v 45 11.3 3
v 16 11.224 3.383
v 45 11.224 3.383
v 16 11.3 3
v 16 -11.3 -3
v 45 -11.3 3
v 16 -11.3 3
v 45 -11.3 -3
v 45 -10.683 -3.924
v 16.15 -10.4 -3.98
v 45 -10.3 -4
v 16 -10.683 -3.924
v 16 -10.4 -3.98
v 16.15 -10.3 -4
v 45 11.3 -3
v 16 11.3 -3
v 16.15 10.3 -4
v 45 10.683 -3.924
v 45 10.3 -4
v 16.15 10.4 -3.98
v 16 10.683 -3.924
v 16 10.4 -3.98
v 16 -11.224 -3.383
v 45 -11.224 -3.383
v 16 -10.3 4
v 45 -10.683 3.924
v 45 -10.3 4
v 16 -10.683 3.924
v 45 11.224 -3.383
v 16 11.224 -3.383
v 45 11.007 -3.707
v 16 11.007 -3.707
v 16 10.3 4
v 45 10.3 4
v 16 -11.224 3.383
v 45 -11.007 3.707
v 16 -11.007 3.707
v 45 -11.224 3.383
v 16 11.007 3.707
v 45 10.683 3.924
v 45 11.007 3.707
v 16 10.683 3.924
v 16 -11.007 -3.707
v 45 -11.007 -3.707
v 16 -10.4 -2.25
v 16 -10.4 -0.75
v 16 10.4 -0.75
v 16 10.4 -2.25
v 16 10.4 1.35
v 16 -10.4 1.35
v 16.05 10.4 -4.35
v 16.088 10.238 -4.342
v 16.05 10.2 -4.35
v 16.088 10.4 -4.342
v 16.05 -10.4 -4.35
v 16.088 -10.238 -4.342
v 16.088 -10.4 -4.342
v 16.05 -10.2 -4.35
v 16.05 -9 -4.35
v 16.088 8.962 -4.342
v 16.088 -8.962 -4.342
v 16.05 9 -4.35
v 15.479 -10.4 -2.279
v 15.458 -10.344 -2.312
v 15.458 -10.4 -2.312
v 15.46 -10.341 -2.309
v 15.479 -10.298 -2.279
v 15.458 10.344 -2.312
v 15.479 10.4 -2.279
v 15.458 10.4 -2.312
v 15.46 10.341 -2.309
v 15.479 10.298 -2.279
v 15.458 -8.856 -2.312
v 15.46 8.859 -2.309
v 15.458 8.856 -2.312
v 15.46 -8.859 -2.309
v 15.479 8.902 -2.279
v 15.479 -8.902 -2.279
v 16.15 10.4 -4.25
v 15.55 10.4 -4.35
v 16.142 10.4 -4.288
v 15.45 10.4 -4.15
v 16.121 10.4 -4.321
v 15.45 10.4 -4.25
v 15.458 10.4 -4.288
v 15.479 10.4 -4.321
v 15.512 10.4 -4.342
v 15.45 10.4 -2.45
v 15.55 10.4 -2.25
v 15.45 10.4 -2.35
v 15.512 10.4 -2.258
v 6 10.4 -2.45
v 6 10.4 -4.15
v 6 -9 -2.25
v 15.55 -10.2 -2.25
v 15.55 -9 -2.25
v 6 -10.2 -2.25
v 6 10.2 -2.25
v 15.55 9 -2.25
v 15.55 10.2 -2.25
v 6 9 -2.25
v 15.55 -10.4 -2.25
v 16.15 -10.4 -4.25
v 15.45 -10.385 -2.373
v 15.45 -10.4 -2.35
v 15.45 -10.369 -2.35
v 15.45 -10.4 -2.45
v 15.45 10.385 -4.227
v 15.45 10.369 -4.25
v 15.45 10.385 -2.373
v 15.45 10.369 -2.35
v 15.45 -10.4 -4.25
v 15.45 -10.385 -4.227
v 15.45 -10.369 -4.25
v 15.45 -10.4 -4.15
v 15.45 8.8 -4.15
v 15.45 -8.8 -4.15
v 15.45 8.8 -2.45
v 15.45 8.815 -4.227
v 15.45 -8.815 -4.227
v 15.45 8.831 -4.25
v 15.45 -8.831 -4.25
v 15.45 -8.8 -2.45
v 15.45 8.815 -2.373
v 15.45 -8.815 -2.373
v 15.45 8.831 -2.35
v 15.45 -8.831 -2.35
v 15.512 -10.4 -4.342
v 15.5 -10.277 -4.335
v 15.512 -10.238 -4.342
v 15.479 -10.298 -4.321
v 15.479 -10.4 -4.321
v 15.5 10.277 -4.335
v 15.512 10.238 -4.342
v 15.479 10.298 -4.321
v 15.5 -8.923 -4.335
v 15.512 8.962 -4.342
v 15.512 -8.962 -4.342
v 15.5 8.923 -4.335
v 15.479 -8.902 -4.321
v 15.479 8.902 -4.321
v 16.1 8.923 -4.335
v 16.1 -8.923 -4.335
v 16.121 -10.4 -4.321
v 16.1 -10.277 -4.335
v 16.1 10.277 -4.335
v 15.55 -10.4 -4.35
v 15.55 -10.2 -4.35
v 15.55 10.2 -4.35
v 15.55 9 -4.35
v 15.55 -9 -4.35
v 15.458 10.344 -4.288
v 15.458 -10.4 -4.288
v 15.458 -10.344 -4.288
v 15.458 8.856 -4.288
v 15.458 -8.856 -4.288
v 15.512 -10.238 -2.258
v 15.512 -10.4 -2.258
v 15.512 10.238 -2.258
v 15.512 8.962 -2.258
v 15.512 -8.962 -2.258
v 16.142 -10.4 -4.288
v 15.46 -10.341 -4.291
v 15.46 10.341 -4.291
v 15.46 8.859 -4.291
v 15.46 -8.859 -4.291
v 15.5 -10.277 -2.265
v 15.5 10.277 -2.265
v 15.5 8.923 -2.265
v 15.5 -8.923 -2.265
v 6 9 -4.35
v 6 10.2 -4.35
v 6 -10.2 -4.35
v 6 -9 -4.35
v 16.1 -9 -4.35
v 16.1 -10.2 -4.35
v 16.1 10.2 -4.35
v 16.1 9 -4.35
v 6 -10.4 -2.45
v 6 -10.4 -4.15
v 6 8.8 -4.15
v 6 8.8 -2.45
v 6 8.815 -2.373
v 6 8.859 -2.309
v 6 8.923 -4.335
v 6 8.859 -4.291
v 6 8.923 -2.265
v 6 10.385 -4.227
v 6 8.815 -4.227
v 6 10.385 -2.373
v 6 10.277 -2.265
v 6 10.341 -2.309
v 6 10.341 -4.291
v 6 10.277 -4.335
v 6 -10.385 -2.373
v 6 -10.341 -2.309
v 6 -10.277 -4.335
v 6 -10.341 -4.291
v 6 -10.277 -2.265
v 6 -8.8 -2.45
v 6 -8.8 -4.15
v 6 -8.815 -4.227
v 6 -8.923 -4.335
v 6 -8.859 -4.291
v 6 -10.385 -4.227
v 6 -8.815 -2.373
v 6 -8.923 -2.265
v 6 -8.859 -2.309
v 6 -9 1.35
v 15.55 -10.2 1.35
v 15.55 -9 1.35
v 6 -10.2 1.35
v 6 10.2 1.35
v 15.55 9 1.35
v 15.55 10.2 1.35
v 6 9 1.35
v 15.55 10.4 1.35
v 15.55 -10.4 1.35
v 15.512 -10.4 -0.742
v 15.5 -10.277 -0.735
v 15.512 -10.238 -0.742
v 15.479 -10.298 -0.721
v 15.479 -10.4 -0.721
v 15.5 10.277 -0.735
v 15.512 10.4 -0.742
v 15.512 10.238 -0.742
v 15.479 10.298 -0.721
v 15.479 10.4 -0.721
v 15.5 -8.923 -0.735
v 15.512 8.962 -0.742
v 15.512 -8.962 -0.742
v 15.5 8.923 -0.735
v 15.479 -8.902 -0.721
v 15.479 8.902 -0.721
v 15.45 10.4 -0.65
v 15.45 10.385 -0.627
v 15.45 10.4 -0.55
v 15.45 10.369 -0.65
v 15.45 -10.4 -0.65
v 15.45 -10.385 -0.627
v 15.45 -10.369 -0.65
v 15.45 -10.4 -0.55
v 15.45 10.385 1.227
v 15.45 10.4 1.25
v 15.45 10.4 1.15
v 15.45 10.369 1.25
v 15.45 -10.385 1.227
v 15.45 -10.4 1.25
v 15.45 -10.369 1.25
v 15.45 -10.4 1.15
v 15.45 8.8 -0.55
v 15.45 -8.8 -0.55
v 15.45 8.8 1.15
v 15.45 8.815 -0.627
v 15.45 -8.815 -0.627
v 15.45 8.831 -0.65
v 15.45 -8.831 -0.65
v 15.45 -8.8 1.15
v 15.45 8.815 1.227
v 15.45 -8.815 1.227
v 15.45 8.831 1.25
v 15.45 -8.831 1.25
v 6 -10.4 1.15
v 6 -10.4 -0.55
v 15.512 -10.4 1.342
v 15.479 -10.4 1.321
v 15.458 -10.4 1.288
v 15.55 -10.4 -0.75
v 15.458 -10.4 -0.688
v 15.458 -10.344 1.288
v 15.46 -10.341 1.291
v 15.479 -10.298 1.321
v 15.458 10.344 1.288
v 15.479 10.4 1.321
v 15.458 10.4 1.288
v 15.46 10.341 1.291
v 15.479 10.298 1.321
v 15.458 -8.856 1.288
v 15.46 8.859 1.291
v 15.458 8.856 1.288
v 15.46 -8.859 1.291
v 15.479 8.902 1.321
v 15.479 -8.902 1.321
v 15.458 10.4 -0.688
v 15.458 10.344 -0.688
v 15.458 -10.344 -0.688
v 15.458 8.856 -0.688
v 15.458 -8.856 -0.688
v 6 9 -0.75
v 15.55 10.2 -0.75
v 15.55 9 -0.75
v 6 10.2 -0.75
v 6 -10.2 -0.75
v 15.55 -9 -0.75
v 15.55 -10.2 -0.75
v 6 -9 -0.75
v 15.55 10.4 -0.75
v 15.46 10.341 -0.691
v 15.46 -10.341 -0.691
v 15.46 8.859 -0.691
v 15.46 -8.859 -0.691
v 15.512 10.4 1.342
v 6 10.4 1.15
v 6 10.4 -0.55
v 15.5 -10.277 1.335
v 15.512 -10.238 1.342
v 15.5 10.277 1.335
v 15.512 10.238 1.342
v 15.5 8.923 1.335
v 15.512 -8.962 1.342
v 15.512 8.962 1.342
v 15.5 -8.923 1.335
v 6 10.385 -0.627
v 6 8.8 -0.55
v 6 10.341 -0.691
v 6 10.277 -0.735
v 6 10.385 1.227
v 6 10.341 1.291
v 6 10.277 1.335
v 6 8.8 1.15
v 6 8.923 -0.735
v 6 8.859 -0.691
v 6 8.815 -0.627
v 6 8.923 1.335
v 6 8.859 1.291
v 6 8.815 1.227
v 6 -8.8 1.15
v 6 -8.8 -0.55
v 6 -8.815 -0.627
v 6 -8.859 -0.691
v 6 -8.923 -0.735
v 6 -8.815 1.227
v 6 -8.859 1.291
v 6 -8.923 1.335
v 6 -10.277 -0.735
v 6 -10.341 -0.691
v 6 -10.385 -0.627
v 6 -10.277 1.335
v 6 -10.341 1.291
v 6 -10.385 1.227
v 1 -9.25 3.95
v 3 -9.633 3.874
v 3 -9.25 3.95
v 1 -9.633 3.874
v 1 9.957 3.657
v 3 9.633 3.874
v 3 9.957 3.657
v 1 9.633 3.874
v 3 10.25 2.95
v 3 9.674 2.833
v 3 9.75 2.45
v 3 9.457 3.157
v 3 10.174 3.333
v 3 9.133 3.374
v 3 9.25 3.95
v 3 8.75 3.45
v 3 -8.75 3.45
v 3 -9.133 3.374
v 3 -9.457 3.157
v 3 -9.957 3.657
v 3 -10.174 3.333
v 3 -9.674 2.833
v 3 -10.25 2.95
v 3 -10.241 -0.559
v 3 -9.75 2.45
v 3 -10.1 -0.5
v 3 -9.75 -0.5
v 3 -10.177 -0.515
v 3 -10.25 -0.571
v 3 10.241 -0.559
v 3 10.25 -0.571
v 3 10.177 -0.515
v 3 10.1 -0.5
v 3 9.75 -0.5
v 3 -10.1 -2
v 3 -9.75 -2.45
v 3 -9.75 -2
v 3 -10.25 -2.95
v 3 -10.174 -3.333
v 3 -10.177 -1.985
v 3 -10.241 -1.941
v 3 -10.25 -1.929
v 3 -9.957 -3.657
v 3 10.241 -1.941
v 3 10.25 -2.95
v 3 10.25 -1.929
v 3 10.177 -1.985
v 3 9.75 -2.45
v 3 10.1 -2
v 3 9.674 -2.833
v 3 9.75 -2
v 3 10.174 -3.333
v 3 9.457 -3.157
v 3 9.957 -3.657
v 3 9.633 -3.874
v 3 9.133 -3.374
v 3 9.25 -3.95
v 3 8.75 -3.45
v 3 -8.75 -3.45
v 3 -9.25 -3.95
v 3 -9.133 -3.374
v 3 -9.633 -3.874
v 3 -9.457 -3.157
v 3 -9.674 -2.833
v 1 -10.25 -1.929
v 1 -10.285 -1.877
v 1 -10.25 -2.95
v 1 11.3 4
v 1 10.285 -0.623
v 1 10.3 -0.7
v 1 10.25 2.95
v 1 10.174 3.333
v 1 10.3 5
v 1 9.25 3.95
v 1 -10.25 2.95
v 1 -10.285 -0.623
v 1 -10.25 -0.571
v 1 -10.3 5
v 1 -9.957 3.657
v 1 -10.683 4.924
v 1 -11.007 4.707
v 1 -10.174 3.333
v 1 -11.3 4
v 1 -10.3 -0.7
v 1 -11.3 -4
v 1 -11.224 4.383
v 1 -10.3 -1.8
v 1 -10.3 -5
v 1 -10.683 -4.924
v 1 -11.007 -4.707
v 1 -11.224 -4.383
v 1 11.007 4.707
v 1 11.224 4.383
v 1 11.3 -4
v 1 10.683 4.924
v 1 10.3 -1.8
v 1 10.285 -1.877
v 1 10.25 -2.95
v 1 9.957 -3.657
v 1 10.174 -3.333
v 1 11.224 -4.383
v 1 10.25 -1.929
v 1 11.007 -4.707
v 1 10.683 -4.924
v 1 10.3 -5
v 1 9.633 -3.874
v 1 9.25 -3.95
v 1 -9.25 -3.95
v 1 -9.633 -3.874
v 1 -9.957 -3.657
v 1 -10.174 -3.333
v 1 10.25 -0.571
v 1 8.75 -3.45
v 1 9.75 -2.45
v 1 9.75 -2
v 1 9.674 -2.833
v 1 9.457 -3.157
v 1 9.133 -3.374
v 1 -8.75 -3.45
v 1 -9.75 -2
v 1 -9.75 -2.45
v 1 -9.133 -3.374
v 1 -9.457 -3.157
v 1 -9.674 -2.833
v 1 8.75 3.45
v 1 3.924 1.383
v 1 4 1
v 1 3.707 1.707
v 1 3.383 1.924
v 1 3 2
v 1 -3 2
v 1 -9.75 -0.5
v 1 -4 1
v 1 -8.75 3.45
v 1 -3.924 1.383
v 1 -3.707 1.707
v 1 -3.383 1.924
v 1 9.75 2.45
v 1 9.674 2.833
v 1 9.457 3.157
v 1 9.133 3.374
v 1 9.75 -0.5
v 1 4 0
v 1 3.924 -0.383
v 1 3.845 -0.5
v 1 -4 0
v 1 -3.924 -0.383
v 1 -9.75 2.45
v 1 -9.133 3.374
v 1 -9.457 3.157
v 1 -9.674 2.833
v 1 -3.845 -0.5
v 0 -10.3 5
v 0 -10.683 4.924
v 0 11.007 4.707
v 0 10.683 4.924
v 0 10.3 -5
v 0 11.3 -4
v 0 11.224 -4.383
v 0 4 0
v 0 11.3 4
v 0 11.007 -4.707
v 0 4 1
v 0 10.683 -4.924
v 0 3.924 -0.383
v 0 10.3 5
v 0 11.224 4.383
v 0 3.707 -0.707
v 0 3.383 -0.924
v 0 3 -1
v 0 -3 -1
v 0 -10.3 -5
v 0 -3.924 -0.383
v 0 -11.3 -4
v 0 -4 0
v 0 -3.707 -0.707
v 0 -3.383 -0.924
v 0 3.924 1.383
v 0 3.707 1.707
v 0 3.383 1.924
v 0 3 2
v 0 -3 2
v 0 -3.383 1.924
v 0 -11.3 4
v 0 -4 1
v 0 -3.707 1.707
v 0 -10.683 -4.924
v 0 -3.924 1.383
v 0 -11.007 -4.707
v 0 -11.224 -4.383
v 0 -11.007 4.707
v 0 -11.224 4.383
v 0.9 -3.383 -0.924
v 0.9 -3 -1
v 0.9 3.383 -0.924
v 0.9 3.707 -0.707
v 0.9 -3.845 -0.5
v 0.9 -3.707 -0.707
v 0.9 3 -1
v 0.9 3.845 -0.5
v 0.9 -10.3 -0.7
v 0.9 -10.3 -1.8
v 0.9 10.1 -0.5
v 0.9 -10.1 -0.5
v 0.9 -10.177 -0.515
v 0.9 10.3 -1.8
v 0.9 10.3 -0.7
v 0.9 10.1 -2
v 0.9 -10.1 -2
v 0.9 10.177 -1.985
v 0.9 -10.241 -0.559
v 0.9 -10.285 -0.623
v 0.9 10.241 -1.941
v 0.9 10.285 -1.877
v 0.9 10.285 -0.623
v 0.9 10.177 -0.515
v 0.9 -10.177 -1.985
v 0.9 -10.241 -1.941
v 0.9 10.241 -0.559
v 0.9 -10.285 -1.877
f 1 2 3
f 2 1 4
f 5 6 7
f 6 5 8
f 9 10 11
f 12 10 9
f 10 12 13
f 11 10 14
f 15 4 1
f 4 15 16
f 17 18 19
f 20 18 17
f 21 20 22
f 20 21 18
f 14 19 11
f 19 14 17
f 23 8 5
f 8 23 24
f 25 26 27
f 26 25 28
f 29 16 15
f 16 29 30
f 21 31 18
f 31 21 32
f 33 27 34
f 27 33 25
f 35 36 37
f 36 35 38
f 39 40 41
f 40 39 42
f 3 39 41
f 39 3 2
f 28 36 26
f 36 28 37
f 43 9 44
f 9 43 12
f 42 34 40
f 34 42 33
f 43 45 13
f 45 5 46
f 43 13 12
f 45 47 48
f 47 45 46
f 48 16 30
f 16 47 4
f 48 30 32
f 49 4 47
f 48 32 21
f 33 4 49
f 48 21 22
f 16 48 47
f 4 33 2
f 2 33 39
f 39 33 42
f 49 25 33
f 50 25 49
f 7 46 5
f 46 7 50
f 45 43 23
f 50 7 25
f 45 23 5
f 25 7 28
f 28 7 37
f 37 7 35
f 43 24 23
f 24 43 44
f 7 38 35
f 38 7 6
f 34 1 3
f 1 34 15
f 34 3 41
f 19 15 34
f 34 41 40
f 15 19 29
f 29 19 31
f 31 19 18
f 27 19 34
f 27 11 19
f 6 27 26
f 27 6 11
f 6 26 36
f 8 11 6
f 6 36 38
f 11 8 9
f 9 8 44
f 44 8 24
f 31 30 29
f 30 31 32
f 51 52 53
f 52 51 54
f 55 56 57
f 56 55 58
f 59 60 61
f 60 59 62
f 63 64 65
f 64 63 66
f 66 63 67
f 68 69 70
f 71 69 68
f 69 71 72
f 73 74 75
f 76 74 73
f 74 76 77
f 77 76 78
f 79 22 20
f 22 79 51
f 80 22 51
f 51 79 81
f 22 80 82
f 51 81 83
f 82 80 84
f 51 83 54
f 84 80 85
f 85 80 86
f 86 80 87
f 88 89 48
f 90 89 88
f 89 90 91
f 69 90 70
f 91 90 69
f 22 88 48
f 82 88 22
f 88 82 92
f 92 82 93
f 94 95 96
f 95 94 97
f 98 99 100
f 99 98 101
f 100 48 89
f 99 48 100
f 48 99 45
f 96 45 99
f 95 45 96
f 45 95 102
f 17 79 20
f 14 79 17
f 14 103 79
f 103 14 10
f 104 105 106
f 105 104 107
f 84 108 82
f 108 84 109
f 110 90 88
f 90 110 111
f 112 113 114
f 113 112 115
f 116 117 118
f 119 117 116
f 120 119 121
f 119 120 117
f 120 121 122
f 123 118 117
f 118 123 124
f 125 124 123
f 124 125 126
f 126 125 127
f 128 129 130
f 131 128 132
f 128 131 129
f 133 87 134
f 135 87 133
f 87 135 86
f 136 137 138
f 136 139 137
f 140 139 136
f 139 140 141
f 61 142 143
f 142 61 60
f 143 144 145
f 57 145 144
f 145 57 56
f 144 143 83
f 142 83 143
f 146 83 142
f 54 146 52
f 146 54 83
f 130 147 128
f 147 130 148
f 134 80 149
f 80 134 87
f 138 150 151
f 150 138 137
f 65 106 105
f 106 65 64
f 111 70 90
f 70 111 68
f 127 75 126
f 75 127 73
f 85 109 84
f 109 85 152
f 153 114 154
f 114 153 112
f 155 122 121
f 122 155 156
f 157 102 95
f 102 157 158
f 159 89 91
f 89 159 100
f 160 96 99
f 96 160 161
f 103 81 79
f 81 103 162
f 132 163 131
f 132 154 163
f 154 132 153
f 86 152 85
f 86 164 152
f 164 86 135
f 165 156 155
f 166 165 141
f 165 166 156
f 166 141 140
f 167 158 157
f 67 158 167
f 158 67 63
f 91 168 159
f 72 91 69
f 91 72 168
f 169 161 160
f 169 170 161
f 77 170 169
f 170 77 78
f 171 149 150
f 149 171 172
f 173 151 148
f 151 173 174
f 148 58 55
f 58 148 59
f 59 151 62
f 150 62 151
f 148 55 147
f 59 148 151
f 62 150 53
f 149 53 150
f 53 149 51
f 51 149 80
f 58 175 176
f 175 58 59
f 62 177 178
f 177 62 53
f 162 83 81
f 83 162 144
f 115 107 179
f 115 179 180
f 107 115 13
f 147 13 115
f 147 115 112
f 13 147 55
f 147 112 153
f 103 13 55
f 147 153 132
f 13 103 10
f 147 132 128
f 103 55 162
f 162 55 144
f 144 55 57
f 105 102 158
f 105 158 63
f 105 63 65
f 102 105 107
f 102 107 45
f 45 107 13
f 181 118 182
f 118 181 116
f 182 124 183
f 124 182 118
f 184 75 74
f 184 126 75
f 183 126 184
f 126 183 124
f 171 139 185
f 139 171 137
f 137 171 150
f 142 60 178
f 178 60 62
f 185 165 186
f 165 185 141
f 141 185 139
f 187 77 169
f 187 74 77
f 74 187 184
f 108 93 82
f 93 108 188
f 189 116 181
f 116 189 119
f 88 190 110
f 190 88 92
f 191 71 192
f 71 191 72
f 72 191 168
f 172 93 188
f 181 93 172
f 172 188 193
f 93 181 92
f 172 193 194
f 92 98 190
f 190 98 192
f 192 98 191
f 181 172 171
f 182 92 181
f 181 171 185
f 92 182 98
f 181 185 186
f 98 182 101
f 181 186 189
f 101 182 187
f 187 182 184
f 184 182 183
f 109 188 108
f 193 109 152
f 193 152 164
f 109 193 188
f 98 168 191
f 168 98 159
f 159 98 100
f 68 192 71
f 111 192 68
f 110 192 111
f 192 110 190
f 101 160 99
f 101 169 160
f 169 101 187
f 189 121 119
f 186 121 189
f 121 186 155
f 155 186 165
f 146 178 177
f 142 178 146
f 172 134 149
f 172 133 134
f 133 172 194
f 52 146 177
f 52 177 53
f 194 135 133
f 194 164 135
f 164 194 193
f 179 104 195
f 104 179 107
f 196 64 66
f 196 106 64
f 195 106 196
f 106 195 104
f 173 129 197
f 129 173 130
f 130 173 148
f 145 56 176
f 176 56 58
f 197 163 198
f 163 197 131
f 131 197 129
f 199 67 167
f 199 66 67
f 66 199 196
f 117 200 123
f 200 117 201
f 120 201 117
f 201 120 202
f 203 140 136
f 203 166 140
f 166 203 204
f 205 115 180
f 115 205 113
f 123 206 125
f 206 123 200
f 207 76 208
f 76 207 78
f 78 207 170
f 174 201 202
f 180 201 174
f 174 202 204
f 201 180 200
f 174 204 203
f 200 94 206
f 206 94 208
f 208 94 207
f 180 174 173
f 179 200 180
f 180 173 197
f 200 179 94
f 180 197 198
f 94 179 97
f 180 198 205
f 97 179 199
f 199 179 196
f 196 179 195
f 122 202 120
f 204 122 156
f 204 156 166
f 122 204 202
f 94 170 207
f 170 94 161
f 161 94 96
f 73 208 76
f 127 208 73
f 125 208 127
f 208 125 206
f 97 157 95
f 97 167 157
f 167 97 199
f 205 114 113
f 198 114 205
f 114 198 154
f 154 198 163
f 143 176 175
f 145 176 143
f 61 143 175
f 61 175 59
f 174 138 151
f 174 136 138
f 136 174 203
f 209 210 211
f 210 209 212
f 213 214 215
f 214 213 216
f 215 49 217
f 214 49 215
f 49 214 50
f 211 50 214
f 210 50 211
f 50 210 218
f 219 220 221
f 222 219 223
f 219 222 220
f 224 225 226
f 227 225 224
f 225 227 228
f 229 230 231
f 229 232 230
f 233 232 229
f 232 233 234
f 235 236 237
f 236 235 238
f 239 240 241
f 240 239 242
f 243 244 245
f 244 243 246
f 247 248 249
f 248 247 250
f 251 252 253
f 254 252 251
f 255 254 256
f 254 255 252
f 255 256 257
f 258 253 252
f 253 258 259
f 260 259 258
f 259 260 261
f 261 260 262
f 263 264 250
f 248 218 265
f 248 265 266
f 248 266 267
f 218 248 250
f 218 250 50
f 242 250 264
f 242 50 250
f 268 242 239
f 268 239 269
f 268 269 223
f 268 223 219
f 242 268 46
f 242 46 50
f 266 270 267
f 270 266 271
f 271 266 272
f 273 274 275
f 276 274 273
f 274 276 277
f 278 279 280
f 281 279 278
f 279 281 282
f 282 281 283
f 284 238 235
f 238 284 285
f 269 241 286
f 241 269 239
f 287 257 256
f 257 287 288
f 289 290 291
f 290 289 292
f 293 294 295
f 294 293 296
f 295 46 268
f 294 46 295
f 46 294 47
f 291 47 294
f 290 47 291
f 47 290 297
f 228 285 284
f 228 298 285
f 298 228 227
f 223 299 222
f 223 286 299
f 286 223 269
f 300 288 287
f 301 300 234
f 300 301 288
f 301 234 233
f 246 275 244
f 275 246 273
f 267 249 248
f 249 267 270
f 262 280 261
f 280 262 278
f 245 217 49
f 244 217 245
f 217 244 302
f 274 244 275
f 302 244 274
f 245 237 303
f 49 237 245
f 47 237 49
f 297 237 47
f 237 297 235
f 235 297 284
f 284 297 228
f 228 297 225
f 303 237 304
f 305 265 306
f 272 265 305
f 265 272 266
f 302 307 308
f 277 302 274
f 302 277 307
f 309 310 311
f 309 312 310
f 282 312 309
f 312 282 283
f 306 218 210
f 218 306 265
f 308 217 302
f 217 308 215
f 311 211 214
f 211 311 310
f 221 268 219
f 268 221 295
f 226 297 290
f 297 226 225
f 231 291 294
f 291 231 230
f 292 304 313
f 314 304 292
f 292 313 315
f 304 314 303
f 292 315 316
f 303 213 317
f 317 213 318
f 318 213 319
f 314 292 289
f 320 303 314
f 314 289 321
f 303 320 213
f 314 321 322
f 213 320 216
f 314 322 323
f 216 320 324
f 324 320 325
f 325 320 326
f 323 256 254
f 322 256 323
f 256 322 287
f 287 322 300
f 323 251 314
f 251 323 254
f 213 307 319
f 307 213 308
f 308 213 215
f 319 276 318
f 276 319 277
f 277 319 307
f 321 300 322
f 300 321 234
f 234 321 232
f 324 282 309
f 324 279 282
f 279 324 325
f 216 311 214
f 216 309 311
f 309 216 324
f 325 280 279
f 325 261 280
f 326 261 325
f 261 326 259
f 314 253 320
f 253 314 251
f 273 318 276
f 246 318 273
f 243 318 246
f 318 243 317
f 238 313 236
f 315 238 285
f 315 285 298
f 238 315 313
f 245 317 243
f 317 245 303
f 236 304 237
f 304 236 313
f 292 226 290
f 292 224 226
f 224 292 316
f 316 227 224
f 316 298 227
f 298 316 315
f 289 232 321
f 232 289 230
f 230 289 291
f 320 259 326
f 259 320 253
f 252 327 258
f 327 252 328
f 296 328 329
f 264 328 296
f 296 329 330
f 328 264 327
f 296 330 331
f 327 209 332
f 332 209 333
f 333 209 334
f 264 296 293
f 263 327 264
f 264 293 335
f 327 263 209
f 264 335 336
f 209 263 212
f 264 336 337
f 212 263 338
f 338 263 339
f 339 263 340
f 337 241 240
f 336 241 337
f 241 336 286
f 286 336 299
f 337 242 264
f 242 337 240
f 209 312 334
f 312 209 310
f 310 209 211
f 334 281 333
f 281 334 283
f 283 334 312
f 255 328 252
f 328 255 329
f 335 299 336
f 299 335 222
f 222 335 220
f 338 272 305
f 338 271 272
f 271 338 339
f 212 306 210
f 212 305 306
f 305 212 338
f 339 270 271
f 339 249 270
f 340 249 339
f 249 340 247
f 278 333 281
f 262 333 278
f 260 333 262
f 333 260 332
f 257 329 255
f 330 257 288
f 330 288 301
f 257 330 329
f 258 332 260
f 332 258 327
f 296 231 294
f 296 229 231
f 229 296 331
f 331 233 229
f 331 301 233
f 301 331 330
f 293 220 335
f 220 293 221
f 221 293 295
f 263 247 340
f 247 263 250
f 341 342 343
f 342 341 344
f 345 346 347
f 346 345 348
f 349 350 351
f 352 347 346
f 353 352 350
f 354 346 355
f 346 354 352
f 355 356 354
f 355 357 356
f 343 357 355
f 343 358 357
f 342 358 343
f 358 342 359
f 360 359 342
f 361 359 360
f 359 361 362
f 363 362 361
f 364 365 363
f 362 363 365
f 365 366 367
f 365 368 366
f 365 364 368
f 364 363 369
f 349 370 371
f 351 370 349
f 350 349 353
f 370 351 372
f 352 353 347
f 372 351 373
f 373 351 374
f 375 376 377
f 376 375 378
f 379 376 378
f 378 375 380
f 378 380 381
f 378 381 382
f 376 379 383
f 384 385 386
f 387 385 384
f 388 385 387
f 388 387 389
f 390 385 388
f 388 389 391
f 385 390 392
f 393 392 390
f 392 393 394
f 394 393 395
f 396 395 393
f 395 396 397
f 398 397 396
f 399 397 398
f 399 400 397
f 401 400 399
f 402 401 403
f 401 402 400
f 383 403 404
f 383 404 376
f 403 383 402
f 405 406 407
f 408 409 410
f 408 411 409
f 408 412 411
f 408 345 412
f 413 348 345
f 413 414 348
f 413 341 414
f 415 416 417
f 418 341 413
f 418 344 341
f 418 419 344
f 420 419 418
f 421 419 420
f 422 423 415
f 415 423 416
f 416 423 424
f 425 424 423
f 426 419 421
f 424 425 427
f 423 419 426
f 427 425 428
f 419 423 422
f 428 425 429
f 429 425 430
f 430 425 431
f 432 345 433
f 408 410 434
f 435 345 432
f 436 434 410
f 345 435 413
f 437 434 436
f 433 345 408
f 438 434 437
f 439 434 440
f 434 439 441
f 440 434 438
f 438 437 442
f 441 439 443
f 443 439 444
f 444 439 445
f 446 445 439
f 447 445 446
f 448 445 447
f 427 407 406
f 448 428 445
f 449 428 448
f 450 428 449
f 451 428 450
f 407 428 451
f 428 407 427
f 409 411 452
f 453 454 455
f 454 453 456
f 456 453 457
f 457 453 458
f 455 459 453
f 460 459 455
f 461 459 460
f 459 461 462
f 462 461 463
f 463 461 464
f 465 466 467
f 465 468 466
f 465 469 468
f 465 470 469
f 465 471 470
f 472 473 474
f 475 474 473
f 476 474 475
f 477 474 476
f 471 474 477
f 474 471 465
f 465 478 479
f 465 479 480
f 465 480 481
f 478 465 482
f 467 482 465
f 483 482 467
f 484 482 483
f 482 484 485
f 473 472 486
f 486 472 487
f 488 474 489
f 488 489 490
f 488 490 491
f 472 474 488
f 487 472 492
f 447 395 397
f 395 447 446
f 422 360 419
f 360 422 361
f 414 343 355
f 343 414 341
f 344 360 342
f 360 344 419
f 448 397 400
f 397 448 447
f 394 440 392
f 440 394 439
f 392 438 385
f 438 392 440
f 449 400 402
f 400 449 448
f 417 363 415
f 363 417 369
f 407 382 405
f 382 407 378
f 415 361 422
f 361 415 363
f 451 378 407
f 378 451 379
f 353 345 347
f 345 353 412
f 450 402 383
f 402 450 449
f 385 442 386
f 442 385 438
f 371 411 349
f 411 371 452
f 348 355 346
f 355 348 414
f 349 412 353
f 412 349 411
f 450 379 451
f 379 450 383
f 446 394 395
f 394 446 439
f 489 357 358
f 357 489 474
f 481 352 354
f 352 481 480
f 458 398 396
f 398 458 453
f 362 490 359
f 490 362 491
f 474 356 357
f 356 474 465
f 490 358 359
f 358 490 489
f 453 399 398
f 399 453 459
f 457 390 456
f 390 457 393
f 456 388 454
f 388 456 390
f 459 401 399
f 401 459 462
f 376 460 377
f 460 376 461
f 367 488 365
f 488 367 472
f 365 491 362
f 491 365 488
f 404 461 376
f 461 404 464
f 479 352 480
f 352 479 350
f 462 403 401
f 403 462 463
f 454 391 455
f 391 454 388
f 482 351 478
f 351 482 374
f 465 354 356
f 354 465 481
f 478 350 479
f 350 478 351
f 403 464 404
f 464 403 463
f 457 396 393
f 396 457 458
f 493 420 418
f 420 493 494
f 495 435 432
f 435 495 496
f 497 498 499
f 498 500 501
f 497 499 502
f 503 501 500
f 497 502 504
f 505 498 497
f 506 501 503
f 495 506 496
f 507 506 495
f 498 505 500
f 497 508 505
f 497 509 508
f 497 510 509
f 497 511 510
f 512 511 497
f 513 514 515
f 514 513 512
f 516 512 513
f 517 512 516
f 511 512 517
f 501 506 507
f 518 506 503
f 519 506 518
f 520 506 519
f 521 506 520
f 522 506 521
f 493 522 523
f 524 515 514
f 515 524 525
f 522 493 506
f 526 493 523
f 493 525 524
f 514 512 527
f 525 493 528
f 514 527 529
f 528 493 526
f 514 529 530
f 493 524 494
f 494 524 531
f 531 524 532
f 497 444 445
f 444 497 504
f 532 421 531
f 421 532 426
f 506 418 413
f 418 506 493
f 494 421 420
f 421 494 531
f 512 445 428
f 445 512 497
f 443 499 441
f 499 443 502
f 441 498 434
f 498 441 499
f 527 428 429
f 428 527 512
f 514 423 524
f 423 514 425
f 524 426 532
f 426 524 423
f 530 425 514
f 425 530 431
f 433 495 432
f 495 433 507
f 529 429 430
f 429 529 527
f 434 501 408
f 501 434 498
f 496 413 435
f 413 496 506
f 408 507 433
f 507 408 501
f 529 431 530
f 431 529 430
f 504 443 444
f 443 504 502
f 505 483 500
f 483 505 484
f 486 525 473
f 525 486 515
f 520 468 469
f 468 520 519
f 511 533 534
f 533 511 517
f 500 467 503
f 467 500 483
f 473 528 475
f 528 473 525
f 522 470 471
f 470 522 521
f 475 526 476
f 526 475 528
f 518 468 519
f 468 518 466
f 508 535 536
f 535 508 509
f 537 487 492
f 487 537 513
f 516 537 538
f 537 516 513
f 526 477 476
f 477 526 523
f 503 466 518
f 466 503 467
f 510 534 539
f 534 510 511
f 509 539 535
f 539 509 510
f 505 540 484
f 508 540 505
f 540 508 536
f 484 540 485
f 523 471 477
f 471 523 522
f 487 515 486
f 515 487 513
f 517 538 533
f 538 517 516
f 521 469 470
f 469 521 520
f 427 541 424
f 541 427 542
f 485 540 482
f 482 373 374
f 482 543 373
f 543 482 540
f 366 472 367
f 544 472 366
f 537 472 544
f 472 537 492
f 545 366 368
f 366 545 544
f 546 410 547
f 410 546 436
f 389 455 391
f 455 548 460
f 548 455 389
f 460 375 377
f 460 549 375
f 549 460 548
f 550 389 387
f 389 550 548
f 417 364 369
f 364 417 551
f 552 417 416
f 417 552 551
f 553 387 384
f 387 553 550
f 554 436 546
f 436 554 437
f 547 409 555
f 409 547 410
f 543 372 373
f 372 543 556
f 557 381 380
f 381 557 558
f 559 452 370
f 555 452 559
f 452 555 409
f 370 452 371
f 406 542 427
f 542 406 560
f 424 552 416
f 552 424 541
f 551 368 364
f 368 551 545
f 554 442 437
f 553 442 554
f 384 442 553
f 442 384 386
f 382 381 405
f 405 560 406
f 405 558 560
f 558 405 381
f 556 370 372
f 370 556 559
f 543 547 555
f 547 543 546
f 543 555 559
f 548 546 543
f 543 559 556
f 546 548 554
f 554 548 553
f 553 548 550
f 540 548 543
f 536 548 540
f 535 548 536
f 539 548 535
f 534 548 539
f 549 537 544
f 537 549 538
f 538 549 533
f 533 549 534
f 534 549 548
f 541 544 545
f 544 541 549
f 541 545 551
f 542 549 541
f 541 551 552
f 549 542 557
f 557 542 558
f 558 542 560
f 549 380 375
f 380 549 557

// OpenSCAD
use <microusb.scad>
translate([45,0,0]) {
    microusb_unit(ox=40, with_vent=1, with_cabling=1, with_shell=0);
}

microusb_unit_lid_only();

translate([-2,0,0]) {
    difference() {
        cube([0,0,0]);
        microusb_unit_lid_negative_voume();
    }
}
